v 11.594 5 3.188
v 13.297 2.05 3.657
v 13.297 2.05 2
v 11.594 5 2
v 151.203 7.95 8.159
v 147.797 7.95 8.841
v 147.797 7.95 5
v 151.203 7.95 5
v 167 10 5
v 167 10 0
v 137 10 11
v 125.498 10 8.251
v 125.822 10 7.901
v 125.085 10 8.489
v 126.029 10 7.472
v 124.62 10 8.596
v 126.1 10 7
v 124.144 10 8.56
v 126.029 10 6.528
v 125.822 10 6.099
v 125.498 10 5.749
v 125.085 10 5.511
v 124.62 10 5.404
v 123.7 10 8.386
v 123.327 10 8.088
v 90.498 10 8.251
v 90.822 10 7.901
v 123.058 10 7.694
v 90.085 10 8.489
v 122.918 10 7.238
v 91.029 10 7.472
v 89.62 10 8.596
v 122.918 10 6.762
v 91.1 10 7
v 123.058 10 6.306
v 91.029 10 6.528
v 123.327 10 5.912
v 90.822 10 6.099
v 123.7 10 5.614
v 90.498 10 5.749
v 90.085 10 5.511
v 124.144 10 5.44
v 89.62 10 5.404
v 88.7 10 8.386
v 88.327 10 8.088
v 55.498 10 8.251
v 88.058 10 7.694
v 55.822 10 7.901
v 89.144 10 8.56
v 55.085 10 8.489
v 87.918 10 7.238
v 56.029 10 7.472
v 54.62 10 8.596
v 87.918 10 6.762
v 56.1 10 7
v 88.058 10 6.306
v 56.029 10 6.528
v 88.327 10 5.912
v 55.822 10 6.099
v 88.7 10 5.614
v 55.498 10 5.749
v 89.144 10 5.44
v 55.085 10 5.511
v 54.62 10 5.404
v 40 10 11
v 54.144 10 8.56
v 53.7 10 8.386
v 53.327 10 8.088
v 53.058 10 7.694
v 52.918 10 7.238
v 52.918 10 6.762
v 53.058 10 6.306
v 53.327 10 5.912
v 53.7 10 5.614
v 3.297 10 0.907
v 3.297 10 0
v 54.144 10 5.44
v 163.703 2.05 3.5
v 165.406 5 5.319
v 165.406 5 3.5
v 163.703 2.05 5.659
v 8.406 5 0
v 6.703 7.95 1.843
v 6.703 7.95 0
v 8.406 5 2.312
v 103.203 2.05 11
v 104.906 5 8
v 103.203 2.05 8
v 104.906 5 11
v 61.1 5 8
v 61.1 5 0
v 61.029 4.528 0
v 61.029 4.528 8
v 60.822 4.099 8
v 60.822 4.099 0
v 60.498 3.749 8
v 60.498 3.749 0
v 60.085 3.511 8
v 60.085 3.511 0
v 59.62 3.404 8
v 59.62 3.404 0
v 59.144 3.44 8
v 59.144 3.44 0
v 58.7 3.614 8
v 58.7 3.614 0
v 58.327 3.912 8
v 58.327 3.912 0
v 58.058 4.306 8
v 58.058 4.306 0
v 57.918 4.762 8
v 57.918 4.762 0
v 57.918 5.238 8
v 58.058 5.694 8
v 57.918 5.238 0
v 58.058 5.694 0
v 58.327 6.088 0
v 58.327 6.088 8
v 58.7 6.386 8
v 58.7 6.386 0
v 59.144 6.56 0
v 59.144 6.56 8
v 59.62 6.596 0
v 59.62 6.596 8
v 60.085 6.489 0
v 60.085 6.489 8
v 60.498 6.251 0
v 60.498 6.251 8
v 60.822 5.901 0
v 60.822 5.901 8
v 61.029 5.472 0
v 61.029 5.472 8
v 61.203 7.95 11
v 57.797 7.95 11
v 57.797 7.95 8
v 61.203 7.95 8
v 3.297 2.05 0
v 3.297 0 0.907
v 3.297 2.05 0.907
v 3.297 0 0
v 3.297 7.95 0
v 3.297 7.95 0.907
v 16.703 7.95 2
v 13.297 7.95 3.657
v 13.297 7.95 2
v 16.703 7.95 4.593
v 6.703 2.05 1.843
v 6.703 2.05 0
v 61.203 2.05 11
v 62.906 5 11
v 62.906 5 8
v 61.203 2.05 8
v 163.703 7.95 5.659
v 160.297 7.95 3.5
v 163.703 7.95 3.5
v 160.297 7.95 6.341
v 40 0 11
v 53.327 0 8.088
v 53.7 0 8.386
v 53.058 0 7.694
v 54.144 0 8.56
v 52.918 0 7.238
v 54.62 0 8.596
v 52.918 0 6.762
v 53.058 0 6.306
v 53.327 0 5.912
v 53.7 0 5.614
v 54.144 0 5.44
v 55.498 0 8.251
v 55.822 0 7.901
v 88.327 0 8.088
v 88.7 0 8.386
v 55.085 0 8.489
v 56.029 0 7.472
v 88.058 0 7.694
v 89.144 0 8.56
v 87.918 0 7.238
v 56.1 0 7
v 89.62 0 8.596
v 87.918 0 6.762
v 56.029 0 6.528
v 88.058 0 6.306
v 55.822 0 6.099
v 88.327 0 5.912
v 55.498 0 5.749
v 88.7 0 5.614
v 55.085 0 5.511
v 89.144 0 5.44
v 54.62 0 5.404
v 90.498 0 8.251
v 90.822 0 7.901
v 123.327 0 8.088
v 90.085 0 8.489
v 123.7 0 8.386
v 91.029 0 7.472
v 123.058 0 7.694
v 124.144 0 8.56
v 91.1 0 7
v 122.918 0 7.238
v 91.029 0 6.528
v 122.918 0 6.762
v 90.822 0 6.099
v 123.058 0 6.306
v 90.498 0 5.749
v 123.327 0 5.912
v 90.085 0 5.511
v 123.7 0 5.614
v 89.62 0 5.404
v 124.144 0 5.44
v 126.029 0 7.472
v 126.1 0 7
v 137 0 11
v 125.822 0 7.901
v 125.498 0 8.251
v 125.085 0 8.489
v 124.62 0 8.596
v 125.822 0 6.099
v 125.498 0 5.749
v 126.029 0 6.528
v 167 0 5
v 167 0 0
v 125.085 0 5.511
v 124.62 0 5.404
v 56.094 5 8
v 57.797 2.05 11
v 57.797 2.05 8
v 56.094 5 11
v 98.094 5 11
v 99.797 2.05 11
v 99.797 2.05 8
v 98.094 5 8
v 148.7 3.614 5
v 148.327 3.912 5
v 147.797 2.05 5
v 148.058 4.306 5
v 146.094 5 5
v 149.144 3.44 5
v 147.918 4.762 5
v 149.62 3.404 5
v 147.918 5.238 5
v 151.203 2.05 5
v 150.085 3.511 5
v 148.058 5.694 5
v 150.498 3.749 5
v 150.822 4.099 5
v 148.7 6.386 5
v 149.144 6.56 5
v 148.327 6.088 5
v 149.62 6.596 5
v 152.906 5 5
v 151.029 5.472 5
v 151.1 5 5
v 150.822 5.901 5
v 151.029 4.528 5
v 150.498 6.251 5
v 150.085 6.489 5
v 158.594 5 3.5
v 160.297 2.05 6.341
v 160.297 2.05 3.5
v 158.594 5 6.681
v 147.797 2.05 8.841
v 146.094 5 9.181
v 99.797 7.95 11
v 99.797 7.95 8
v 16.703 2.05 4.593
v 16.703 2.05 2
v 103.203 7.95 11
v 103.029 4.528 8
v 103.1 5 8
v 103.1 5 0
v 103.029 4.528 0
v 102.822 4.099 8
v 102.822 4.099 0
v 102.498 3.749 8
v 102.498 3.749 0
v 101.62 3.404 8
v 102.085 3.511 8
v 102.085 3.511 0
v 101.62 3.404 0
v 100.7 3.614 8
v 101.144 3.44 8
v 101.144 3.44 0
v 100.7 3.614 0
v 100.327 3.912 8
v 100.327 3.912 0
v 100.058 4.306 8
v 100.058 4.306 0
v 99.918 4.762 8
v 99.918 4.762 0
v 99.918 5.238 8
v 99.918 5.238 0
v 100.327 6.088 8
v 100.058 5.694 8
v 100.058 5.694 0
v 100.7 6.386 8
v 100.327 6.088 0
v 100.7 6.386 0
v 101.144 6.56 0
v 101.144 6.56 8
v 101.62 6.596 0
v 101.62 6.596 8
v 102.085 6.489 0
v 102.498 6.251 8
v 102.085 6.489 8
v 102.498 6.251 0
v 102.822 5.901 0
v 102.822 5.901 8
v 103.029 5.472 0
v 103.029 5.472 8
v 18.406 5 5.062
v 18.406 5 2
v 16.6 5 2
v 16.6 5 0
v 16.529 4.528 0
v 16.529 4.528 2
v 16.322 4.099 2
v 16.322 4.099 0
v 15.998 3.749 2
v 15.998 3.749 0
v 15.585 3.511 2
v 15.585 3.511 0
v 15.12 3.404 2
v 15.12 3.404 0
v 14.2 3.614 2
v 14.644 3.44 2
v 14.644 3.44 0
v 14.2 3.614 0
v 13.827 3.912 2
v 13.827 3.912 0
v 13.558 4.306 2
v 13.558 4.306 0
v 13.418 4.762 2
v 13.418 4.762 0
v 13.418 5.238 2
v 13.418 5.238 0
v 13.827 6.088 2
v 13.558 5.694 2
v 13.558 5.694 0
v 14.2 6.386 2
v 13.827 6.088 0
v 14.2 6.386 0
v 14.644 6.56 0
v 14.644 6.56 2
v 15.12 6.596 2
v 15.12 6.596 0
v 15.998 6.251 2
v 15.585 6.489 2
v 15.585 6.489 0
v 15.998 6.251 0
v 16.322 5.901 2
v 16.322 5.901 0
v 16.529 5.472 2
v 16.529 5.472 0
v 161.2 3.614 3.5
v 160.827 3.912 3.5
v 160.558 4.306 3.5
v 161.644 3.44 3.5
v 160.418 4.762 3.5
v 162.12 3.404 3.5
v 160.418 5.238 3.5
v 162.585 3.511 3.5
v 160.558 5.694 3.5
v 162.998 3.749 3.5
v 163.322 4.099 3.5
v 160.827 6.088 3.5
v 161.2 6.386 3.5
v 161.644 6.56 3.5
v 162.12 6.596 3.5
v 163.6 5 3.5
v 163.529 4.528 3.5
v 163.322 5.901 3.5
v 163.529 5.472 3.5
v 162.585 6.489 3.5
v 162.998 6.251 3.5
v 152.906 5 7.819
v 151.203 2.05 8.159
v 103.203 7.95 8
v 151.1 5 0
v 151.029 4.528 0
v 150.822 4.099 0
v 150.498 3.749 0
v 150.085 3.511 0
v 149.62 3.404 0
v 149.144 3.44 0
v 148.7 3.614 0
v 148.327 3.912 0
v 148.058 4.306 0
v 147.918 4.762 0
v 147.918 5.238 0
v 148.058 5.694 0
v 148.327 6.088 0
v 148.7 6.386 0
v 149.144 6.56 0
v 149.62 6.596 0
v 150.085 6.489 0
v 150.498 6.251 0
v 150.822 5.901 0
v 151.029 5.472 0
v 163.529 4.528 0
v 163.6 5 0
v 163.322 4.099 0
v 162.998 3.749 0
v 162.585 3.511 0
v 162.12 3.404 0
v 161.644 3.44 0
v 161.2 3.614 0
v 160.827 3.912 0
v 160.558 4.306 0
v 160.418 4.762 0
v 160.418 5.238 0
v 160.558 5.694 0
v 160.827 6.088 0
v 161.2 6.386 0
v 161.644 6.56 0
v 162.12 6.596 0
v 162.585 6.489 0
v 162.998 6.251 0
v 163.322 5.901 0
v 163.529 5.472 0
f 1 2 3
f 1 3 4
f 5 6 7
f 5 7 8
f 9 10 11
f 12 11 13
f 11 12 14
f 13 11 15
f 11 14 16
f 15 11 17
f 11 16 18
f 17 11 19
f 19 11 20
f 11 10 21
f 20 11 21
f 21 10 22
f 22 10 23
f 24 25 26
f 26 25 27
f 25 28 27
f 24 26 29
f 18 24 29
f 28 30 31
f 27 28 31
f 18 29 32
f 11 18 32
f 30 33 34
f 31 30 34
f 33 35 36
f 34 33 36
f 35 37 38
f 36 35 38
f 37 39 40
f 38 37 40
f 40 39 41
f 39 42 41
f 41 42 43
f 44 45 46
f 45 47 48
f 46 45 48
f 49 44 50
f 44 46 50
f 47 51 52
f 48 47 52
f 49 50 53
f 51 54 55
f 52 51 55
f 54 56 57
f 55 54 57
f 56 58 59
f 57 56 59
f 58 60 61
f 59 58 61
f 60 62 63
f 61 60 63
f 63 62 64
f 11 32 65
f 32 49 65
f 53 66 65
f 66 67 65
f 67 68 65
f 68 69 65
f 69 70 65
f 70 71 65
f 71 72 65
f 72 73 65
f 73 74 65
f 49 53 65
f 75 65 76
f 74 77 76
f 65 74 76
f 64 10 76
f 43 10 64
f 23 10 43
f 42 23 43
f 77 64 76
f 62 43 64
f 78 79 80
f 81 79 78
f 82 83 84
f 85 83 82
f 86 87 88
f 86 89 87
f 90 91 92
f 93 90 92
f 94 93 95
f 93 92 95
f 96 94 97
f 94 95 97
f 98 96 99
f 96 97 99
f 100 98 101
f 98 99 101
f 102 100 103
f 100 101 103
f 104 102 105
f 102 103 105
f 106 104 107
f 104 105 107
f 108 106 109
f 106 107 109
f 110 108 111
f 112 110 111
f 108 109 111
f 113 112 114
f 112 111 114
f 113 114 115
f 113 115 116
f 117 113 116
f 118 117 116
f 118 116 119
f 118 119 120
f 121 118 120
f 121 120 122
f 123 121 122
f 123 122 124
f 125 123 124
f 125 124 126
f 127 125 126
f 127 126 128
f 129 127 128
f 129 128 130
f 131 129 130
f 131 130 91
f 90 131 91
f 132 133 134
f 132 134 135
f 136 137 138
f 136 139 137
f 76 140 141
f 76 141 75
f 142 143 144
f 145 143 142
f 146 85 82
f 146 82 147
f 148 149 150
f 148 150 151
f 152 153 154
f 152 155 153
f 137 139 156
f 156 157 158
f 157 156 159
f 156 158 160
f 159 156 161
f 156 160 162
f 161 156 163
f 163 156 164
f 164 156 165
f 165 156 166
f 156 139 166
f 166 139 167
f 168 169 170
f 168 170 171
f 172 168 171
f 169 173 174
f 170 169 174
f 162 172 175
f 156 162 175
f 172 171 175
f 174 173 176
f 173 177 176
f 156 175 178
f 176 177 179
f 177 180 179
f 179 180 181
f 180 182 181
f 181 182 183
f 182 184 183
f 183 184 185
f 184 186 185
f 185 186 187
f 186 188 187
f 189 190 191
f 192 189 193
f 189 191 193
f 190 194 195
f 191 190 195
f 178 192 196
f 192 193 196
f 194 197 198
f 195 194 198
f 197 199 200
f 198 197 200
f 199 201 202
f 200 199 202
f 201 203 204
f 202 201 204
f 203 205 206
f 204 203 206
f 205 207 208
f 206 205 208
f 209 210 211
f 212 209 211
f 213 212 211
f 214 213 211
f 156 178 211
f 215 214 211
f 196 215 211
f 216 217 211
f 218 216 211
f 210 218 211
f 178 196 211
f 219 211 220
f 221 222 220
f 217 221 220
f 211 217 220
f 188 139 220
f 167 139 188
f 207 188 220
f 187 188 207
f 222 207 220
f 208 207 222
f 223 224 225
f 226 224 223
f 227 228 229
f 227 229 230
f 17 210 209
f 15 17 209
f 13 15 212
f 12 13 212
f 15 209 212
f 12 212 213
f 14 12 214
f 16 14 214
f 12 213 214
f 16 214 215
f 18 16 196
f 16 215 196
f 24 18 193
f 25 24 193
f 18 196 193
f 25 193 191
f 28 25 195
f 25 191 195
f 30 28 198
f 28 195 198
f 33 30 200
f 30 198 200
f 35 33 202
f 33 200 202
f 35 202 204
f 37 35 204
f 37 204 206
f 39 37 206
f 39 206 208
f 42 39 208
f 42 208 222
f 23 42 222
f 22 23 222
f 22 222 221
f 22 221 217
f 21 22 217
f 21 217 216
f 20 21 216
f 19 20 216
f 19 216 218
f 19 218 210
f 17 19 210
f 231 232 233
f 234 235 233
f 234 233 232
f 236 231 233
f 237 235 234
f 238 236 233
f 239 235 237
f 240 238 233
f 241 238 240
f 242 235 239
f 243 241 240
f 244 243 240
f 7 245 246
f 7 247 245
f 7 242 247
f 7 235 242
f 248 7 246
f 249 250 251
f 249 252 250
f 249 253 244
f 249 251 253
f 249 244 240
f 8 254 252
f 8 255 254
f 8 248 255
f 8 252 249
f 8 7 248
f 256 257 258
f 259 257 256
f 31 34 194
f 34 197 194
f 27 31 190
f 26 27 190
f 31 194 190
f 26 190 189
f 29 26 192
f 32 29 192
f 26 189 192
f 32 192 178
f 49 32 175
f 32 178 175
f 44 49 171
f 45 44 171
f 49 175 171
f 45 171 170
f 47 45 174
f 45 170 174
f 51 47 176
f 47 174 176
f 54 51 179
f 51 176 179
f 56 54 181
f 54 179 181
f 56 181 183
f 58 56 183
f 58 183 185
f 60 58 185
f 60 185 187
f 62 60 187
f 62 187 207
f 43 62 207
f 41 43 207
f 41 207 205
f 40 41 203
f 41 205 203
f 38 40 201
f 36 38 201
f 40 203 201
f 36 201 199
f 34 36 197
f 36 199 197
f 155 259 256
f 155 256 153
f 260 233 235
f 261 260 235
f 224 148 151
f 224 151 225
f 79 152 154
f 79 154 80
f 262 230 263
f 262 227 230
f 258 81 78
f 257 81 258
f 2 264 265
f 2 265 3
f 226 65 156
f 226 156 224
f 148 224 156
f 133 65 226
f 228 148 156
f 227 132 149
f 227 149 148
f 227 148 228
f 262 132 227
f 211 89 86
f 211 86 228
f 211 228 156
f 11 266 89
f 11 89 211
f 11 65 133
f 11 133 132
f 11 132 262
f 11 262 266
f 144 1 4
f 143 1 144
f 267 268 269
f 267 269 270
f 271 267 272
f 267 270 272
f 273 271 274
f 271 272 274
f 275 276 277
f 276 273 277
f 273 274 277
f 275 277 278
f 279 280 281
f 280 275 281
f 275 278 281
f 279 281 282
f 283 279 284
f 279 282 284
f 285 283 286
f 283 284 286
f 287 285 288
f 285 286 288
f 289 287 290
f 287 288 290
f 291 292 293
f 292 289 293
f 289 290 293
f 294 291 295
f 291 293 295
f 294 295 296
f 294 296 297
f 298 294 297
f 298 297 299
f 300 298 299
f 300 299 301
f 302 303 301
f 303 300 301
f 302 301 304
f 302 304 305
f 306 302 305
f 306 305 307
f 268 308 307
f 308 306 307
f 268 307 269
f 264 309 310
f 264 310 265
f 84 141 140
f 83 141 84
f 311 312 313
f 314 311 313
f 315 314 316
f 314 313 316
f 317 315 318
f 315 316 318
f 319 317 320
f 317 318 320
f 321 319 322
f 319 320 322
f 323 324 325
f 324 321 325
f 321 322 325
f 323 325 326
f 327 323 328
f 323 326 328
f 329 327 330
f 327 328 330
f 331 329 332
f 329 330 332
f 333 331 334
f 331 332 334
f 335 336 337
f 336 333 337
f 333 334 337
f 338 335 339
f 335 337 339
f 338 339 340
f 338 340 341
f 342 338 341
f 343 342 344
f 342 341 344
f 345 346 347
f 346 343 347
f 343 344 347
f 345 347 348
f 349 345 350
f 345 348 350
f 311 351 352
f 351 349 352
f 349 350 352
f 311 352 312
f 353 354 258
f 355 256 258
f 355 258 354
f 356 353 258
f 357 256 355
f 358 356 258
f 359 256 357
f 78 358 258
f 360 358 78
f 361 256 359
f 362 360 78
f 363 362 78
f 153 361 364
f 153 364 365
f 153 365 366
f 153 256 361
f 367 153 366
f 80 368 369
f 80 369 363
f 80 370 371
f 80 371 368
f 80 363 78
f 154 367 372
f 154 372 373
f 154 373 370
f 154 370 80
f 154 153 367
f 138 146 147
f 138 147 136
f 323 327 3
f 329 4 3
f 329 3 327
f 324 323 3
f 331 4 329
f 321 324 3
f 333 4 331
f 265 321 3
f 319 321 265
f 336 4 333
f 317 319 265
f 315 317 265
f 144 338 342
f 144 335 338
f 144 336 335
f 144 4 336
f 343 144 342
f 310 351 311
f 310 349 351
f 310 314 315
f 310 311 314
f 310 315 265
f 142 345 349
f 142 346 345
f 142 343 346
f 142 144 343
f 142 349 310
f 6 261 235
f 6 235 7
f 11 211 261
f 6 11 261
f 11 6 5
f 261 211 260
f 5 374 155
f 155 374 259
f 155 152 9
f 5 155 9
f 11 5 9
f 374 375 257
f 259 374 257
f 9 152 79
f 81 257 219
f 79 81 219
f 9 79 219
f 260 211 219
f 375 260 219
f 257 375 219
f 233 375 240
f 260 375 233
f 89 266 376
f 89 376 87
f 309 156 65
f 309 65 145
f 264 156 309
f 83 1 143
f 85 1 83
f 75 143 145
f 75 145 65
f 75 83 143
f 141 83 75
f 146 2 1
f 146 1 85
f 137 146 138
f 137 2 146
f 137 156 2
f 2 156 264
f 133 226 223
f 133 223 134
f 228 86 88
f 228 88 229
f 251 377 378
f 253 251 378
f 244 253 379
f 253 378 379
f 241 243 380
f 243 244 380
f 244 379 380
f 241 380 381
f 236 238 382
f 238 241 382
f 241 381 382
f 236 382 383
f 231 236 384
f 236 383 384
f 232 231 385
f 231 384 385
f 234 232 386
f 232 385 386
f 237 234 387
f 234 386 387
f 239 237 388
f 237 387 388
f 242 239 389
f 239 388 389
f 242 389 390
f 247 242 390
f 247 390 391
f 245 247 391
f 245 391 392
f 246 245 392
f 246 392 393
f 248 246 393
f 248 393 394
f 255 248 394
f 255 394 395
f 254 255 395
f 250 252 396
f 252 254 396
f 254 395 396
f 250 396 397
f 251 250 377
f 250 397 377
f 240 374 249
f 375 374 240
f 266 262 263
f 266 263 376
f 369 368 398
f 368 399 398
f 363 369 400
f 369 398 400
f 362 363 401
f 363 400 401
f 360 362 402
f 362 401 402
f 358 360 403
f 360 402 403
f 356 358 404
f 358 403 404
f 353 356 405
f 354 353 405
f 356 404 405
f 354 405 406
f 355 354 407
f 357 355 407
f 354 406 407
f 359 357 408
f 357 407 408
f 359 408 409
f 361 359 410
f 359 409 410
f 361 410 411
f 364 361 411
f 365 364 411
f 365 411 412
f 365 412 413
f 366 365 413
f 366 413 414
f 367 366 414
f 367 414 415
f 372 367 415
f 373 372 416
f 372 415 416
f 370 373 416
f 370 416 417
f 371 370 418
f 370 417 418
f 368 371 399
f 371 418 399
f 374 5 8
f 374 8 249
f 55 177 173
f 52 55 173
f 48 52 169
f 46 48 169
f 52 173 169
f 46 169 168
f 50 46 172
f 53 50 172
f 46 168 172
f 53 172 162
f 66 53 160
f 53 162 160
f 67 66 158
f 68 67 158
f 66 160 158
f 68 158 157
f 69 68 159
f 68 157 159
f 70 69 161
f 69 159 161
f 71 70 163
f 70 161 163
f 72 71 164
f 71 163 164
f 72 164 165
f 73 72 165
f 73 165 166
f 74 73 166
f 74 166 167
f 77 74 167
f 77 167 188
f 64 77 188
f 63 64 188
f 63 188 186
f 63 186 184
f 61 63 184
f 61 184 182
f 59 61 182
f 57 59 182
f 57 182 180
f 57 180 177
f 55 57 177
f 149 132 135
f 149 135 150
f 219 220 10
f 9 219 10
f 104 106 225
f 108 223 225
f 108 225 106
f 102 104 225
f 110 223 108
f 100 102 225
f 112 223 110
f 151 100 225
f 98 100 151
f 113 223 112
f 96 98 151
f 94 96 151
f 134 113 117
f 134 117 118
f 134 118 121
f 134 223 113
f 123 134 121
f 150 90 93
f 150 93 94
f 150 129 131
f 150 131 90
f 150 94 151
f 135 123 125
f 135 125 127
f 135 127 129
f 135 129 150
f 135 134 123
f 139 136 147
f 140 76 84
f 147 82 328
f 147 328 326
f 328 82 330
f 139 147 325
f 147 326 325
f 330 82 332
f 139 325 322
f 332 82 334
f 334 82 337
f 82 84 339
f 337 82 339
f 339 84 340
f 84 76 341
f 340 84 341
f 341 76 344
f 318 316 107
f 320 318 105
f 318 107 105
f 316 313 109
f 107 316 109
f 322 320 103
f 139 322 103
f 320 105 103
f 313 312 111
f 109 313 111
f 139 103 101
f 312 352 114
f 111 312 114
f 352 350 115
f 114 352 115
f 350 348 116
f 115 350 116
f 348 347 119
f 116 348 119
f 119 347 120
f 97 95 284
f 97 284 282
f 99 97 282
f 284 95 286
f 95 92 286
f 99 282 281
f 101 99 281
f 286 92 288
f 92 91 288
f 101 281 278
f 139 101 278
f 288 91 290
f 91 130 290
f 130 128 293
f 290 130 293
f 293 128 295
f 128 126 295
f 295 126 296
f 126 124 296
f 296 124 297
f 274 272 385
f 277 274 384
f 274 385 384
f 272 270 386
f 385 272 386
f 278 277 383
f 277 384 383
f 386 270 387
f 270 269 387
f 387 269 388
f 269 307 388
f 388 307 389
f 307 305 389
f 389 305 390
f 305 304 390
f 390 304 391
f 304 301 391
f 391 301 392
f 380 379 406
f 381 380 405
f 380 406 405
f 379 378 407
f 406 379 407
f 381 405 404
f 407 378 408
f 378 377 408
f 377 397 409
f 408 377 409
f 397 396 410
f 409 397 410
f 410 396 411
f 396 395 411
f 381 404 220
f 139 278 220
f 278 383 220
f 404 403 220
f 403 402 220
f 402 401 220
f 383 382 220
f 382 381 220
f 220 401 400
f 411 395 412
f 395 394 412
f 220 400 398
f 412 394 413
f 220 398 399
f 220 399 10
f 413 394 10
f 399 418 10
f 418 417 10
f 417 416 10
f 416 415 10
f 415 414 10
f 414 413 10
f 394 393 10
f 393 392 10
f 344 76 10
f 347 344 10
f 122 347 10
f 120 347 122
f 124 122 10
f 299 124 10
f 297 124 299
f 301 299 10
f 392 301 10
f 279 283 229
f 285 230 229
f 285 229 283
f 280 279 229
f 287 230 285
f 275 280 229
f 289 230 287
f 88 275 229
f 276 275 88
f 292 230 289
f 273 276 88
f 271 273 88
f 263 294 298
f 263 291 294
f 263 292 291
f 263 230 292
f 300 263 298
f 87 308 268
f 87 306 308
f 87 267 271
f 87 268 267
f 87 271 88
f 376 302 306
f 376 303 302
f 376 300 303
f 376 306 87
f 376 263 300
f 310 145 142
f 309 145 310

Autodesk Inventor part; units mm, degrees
ref_plane "YZ Plane" through (0, 0, 0) normal (1, 0, 0) x (0, 1, 0)
ref_plane "XZ Plane" through (0, 0, 0) normal (0, 1, 0) x (-1, 0, 0)
ref_plane "XY Plane" through (0, 0, 0) normal (0, 0, 1) x (1, 0, 0)
sketch "Sketch1" plane through (0, 0, 0) normal (0, 0, 1) x (1, 0, 0)
  line L0 (0, 0) -> (167, 0)
  line L1 (167, 0) -> (167, 10)
  line L2 (167, 10) -> (0, 10)
  line L3 (0, 10) -> (0, 0)
  circle A0 centre (59.5, 5) radius 1.6
  circle A1 centre (101.5, 5) radius 1.6
  circle A2 centre (162, 5) radius 1.6
  circle A3 centre (149.5, 5) radius 1.6
  circle A4 centre (15, 5) radius 1.6
  circle A5 centre (5, 5) radius 1.6
  dimension "d1" = 10
  dimension "d2" = 90
  dimension "d4" = 3.2
  dimension "d6" = 3.2
  dimension "d7" = 3.2
  dimension "d8" = 42
  dimension "d9" = 60.5
  dimension "d26" = 3.2
  dimension "d27" = 48
  dimension "d28" = 3.2
  dimension "d29" = 44.5
  dimension "d32" = 15
  dimension "d33" = 5
  dimension "d61" = 3.2
  dimension "d62" = 10
  dimension "d63" = 12.5
ref_plane "Work Plane2" through (0, 0, 0) normal (0, -1, 0) x (1, 0, 0)
sketch "Sketch2" plane through (0, 0, 0) normal (0, -1, 0) x (1, 0, 0)
  circle A0 centre (54.5, 7) radius 1.6
  circle A1 centre (124.5, 7) radius 1.6
  circle A2 centre (89.5, 7) radius 1.6
  point P0 (0, 0)
  dimension "d13" = 3.2
  dimension "d15" = 3.2
  dimension "d16" = 70
  dimension "d17" = 3.2
  dimension "d18" = 35
  dimension "d64" = 54.5
  dimension "d65" = 35
ref_plane "Work Plane1" through (0, 0, 11) normal (0, 0, 1) x (1, 0, 0)
extrude "klocek" add sketch "Sketch1" along normal blind 11
ref_plane "Work Plane3" through (0, 0, 0) normal (0, -1, 0) x (1, 0, 0)
extrude "prowadzenie osi" cut sketch "Sketch2" against normal up to next
ref_plane "Work Plane4" through (0, 0, 0) normal (0, -1, 0) x (1, 0, 0)
sketch "Sketch7" plane through (0, 0, 0) normal (0, -1, 0) x (1, 0, 0)
  line L0 (0, 11) -> (0, 0)
  line L1 (0, 11) -> (167, 11) projected
  line L2 (0, 11) -> (40, 11)
  line L3 (40, 11) -> (0, 0)
  point P0 (0, -1.8333)
  dimension "d86" = 11
  dimension "d87" = 40
sketch "Sketch8" plane through (0, 0, 0) normal (0, -1, 0) x (1, 0, 0)
  line L0 (167, 0) -> (167, 11) projected
  line L1 (167, 11) -> (167, 5)
  line L2 (167, 11) -> (0, 11) projected
  line L3 (167, 11) -> (137, 11)
  line L4 (137, 11) -> (167, 5)
  point P0 (0, 0)
  point P1 (40.8333, 11)
  dimension "d80" = 6
  dimension "d81" = 30
extrude "przedni skos" cut sketch "Sketch7" against normal up to next
extrude "tylni skos" cut sketch "Sketch8" against normal up to next
ref_plane "Work Plane7" through (0, 0, 11) normal (0, 0, 1) x (1, 0, 0)
sketch "Sketch5" plane through (0, 0, 11) normal (0, 0, 1) x (1, 0, 0)
  line L0 (62.9064, 5) -> (61.2032, 2.05)
  line L1 (61.2032, 2.05) -> (57.7968, 2.05)
  line L2 (57.7968, 2.05) -> (56.0936, 5)
  line L3 (56.0936, 5) -> (57.7968, 7.95)
  line L4 (57.7968, 7.95) -> (61.2032, 7.95)
  line L5 (61.2032, 7.95) -> (62.9064, 5)
  circle A0 centre (101.5, 5) radius 1.6 projected
  line L6 (98.0936, 5) -> (99.7968, 7.95)
  line L7 (99.7968, 7.95) -> (103.2032, 7.95)
  line L8 (103.2032, 7.95) -> (104.9064, 5)
  line L9 (104.9064, 5) -> (103.2032, 2.05)
  line L10 (103.2032, 2.05) -> (99.7968, 2.05)
  line L11 (99.7968, 2.05) -> (98.0936, 5)
  point P0 (59.5, 5)
  point P1 (119.5, 5)
  dimension "d45" = 5.9
  dimension "d98" = 5.9
extrude "hex insert middle" cut sketch "Sketch5" against normal blind 3
ref_plane "Work Plane6" through (0, 0, 11) normal (0, 0, 1) x (1, 0, 0)
sketch "Sketch9" plane through (0, 0, 11) normal (0, 0, 1) x (1, 0, 0)
  circle A0 centre (149.5, 5) radius 1.6 projected
  line L0 (152.9064, 5) -> (151.2032, 2.05)
  line L1 (151.2032, 2.05) -> (147.7968, 2.05)
  line L2 (147.7968, 2.05) -> (146.0936, 5)
  line L3 (146.0936, 5) -> (147.7968, 7.95)
  line L4 (147.7968, 7.95) -> (151.2032, 7.95)
  line L5 (151.2032, 7.95) -> (152.9064, 5)
  point P0 (0, 0)
  point P1 (153, 5)
  dimension "d99" = 5.9
extrude "hex insert rear 1" cut sketch "Sketch9" against normal blind 6
ref_plane "Work Plane5" through (0, 0, 11) normal (0, 0, 1) x (1, 0, 0)
sketch "Sketch10" plane through (0, 0, 11) normal (0, 0, 1) x (1, 0, 0)
  line L0 (160.2968, 7.95) -> (163.7032, 7.95)
  line L1 (163.7032, 7.95) -> (165.4064, 5)
  line L2 (165.4064, 5) -> (163.7032, 2.05)
  line L3 (163.7032, 2.05) -> (160.2968, 2.05)
  line L4 (160.2968, 2.05) -> (158.5936, 5)
  line L5 (158.5936, 5) -> (160.2968, 7.95)
  point P0 (0, 0)
  point P1 (162, 5)
  point P2 (162, 5)
  dimension "d72" = 5.9
extrude "hex insert rear 2" cut sketch "Sketch10" against normal blind 7.5
sketch "Sketch13" plane through (0, 0, 11) normal (0, 0, 1) x (1, 0, 0)
  circle A0 centre (5, 5) radius 1.6 projected
  line L0 (8.4064, 5) -> (6.7032, 2.05)
  line L1 (6.7032, 2.05) -> (3.2968, 2.05)
  line L2 (3.2968, 2.05) -> (1.5936, 5)
  line L3 (1.5936, 5) -> (3.2968, 7.95)
  line L4 (3.2968, 7.95) -> (6.7032, 7.95)
  line L5 (6.7032, 7.95) -> (8.4064, 5)
  point P0 (0, 0)
  dimension "d90" = 5.9
extrude "hex insert front 1" cut sketch "Sketch13" against normal through all
sketch "Sketch16" plane through (0, 0, 11) normal (0, 0, 1) x (1, 0, 0)
  circle A0 centre (15, 5) radius 1.6 projected
  line L0 (18.4064, 5) -> (16.7032, 2.05)
  line L1 (16.7032, 2.05) -> (13.2968, 2.05)
  line L2 (13.2968, 2.05) -> (11.5936, 5)
  line L3 (11.5936, 5) -> (13.2968, 7.95)
  line L4 (13.2968, 7.95) -> (16.7032, 7.95)
  line L5 (16.7032, 7.95) -> (18.4064, 5)
  point P0 (0, 0)
  dimension "d93" = 5.9
extrude "hex insert front 2" cut sketch "Sketch16" against normal blind 9
sketch "Sketch17" plane through (0, 0, 0) normal (0, 0, -1) x (-1, 0, 0)
  line L0 (0, 10) -> (0, 0) projected
  line L1 (0, 0) -> (-3.2968, 0)
  line L2 (-3.2968, 0) -> (-3.2968, 10.0042)
  line L3 (-3.2968, 10.0042) -> (0, 10.0042)
  line L4 (0, 10.0042) -> (0, 0)
extrude "Extrusion20" cut sketch "Sketch17" against normal up to next
properties part number "wheel_support_extra_short"
